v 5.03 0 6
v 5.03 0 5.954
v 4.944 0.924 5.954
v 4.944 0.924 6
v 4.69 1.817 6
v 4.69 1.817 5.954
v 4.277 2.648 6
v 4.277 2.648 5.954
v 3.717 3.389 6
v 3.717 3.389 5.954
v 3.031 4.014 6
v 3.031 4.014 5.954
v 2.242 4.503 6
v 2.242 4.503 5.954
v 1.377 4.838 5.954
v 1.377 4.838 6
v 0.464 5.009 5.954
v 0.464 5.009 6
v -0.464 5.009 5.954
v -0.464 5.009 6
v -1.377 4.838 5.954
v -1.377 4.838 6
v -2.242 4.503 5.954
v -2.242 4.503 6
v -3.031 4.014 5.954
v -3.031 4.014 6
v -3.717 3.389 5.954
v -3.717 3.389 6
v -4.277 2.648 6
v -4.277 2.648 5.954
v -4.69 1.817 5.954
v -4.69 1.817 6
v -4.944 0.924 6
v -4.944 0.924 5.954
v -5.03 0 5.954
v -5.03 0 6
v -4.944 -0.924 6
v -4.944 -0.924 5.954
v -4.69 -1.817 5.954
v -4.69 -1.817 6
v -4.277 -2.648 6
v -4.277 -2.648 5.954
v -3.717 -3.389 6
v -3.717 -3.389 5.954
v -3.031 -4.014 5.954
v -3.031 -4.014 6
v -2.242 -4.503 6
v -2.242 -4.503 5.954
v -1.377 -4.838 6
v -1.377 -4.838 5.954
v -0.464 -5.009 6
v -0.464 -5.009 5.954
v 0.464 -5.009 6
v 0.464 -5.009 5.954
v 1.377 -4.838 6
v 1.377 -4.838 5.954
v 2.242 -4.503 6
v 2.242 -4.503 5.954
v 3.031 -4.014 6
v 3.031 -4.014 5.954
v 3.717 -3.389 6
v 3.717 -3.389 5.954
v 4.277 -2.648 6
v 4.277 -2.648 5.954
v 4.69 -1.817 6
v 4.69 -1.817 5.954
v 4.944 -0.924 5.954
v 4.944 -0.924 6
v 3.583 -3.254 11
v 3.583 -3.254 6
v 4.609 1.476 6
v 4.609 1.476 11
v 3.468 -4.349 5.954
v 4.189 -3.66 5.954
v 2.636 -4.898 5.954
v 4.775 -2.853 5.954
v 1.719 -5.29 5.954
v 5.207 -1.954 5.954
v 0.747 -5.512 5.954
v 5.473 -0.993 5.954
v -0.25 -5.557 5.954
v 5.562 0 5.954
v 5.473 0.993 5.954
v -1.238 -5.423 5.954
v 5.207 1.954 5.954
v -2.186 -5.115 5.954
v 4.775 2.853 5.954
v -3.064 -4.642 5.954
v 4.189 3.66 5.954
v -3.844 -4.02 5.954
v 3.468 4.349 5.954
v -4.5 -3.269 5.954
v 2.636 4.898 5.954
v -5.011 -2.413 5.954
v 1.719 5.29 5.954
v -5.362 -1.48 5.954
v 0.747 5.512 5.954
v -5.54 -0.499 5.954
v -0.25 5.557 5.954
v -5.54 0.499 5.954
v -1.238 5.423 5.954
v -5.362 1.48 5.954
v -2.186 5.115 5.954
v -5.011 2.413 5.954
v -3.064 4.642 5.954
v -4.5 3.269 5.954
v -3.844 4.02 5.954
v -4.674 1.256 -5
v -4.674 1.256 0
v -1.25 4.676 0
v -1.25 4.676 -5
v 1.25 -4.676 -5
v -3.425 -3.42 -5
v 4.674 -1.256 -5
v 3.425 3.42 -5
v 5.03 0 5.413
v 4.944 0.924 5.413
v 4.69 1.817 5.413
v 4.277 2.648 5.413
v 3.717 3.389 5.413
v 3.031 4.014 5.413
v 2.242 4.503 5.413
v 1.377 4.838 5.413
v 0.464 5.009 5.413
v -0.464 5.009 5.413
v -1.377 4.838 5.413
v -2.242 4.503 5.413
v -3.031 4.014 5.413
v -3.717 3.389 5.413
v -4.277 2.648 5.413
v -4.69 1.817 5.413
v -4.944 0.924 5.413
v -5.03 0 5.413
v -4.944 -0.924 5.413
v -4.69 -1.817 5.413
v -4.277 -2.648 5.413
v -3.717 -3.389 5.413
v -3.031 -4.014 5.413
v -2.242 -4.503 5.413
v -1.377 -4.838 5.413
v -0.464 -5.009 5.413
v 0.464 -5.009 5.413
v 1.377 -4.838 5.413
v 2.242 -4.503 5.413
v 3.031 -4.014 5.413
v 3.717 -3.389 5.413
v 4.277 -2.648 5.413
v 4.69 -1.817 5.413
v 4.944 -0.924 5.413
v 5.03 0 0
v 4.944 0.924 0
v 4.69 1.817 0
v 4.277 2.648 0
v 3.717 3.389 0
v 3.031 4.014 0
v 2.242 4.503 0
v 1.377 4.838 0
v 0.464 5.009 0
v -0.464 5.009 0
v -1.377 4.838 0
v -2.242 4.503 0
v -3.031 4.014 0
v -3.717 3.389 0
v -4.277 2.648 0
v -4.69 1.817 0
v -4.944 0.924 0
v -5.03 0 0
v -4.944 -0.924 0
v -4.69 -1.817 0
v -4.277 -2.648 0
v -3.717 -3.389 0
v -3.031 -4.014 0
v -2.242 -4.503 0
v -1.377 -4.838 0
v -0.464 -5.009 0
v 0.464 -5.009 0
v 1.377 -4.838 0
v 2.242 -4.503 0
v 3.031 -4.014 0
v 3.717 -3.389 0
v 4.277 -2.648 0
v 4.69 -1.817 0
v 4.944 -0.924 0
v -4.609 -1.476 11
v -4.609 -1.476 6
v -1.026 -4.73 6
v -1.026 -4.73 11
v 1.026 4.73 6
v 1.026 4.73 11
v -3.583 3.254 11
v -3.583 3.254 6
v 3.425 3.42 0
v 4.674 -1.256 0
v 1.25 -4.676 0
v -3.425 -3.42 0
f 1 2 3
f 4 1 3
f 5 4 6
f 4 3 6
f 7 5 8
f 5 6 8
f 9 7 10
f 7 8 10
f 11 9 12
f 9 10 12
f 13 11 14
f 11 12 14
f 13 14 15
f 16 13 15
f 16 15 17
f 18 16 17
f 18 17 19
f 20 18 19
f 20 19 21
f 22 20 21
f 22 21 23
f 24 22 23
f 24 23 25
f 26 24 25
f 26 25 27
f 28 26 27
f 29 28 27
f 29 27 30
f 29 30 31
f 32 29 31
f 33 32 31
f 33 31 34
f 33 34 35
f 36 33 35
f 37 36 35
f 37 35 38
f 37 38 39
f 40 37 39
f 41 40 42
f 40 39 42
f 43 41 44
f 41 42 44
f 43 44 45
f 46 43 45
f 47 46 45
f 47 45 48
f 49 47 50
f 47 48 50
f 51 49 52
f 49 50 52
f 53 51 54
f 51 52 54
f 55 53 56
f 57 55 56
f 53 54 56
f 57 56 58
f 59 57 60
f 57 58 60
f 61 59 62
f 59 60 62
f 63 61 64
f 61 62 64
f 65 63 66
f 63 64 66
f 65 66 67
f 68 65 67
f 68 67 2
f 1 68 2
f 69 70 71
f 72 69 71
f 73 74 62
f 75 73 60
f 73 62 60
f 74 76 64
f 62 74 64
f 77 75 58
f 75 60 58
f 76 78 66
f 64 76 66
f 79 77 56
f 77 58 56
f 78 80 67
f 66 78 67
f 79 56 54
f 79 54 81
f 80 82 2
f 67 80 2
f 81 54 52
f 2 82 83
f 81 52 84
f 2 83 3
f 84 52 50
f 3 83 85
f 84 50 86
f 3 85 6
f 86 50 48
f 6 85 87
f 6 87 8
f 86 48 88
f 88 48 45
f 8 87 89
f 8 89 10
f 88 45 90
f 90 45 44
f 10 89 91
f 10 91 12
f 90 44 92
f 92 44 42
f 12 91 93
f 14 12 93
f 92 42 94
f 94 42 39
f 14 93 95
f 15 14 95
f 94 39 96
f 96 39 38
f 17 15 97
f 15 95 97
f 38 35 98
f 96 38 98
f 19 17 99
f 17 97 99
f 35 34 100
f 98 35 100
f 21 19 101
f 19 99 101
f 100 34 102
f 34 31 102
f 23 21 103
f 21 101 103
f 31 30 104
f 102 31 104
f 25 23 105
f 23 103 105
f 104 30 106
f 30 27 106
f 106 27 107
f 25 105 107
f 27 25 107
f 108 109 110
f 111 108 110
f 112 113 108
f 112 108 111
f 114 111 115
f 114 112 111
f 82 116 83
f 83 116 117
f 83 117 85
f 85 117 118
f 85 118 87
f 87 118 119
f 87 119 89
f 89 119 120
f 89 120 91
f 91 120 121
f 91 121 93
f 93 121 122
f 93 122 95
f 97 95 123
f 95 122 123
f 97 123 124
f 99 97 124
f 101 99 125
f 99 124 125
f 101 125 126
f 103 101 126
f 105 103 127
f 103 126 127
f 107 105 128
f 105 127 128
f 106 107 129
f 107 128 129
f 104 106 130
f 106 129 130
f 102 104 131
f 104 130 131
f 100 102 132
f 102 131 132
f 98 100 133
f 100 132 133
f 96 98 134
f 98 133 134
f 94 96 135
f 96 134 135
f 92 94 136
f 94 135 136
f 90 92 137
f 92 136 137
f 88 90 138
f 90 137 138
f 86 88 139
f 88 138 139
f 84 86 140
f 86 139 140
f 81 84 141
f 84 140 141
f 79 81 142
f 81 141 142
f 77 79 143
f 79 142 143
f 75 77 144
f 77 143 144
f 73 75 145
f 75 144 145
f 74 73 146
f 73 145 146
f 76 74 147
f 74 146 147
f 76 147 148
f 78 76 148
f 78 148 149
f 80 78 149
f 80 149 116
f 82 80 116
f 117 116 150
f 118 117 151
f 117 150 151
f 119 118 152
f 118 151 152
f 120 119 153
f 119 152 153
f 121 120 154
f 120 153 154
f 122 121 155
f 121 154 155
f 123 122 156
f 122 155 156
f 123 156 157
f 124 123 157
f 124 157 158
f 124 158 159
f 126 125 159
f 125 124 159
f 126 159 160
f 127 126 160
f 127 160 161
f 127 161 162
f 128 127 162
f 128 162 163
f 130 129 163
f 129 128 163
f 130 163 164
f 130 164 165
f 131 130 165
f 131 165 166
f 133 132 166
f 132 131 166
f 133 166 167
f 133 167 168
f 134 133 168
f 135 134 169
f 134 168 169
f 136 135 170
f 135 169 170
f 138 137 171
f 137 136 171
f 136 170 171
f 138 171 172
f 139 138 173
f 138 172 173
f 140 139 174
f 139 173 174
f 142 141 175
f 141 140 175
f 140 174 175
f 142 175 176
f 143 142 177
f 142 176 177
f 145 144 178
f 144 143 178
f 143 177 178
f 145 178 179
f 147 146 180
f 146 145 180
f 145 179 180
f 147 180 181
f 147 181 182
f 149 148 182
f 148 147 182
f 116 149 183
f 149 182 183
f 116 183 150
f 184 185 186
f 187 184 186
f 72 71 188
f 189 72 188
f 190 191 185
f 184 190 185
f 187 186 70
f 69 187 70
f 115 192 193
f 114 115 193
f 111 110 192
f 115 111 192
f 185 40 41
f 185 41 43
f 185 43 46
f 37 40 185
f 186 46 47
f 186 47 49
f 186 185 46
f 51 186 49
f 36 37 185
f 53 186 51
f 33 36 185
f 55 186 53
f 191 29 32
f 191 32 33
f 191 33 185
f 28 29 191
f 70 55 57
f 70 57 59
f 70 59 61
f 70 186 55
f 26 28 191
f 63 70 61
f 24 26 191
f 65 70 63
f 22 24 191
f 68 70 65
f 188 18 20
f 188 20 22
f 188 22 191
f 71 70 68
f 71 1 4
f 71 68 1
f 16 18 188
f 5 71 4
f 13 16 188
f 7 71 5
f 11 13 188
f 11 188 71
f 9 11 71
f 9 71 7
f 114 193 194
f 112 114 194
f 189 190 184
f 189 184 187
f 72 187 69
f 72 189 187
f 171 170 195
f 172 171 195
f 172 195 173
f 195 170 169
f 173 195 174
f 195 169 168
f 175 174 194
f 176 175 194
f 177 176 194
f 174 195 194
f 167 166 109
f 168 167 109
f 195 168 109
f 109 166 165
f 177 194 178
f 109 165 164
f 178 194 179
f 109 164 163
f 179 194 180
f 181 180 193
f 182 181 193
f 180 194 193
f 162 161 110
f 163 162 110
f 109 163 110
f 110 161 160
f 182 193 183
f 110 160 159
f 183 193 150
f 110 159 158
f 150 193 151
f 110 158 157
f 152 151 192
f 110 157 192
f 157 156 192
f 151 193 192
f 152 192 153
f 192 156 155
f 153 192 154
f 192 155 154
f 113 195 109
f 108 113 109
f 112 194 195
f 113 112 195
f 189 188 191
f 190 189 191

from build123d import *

# Parameters (mm, degrees)
SKETCH_R     = 5.03
PAD_DEPTH    = 6
PAD001_DEPTH = 5
PAD002_DEPTH = 5


with BuildPart() as part:
    # Sketch → Pad (new body)
    with BuildSketch(Plane.XY):
        Circle(SKETCH_R)
    extrude(amount=PAD_DEPTH)

    # Sketch001 → Revolution (revolve)
    with BuildSketch(Plane.XZ):
        Polygon((4.824, 5.954), (5.562116, 5.954), (4.824, 5.204), align=None)
    revolve(axis=Axis((0, 0, 0), (0, 0, 1)))

    # Sketch002 (on Face6 of Revolution) → Pad001 (join)
    with BuildSketch(Plane.XY.offset(6)):
        Polygon((3.583031, -3.253843), (4.609426, 1.476074), (1.026395, 4.729917), (-3.583031, 3.253843), (-4.609426, -1.476074), (-1.026395, -4.729917), align=None)
    extrude(amount=PAD001_DEPTH)

    # Sketch003 (on Face2 of Pad001) → Pad002 (join)
    with BuildSketch(Plane(origin=(0, 0, 0), x_dir=(1, 0, 0), z_dir=(0, 0, -1))):
        Polygon((3.424679, -3.420114), (4.674245, 1.255802), (1.249566, 4.675915), (-3.424679, 3.420114), (-4.674245, -1.255802), (-1.249566, -4.675915), align=None)
    extrude(amount=PAD002_DEPTH)


solid = part.part
